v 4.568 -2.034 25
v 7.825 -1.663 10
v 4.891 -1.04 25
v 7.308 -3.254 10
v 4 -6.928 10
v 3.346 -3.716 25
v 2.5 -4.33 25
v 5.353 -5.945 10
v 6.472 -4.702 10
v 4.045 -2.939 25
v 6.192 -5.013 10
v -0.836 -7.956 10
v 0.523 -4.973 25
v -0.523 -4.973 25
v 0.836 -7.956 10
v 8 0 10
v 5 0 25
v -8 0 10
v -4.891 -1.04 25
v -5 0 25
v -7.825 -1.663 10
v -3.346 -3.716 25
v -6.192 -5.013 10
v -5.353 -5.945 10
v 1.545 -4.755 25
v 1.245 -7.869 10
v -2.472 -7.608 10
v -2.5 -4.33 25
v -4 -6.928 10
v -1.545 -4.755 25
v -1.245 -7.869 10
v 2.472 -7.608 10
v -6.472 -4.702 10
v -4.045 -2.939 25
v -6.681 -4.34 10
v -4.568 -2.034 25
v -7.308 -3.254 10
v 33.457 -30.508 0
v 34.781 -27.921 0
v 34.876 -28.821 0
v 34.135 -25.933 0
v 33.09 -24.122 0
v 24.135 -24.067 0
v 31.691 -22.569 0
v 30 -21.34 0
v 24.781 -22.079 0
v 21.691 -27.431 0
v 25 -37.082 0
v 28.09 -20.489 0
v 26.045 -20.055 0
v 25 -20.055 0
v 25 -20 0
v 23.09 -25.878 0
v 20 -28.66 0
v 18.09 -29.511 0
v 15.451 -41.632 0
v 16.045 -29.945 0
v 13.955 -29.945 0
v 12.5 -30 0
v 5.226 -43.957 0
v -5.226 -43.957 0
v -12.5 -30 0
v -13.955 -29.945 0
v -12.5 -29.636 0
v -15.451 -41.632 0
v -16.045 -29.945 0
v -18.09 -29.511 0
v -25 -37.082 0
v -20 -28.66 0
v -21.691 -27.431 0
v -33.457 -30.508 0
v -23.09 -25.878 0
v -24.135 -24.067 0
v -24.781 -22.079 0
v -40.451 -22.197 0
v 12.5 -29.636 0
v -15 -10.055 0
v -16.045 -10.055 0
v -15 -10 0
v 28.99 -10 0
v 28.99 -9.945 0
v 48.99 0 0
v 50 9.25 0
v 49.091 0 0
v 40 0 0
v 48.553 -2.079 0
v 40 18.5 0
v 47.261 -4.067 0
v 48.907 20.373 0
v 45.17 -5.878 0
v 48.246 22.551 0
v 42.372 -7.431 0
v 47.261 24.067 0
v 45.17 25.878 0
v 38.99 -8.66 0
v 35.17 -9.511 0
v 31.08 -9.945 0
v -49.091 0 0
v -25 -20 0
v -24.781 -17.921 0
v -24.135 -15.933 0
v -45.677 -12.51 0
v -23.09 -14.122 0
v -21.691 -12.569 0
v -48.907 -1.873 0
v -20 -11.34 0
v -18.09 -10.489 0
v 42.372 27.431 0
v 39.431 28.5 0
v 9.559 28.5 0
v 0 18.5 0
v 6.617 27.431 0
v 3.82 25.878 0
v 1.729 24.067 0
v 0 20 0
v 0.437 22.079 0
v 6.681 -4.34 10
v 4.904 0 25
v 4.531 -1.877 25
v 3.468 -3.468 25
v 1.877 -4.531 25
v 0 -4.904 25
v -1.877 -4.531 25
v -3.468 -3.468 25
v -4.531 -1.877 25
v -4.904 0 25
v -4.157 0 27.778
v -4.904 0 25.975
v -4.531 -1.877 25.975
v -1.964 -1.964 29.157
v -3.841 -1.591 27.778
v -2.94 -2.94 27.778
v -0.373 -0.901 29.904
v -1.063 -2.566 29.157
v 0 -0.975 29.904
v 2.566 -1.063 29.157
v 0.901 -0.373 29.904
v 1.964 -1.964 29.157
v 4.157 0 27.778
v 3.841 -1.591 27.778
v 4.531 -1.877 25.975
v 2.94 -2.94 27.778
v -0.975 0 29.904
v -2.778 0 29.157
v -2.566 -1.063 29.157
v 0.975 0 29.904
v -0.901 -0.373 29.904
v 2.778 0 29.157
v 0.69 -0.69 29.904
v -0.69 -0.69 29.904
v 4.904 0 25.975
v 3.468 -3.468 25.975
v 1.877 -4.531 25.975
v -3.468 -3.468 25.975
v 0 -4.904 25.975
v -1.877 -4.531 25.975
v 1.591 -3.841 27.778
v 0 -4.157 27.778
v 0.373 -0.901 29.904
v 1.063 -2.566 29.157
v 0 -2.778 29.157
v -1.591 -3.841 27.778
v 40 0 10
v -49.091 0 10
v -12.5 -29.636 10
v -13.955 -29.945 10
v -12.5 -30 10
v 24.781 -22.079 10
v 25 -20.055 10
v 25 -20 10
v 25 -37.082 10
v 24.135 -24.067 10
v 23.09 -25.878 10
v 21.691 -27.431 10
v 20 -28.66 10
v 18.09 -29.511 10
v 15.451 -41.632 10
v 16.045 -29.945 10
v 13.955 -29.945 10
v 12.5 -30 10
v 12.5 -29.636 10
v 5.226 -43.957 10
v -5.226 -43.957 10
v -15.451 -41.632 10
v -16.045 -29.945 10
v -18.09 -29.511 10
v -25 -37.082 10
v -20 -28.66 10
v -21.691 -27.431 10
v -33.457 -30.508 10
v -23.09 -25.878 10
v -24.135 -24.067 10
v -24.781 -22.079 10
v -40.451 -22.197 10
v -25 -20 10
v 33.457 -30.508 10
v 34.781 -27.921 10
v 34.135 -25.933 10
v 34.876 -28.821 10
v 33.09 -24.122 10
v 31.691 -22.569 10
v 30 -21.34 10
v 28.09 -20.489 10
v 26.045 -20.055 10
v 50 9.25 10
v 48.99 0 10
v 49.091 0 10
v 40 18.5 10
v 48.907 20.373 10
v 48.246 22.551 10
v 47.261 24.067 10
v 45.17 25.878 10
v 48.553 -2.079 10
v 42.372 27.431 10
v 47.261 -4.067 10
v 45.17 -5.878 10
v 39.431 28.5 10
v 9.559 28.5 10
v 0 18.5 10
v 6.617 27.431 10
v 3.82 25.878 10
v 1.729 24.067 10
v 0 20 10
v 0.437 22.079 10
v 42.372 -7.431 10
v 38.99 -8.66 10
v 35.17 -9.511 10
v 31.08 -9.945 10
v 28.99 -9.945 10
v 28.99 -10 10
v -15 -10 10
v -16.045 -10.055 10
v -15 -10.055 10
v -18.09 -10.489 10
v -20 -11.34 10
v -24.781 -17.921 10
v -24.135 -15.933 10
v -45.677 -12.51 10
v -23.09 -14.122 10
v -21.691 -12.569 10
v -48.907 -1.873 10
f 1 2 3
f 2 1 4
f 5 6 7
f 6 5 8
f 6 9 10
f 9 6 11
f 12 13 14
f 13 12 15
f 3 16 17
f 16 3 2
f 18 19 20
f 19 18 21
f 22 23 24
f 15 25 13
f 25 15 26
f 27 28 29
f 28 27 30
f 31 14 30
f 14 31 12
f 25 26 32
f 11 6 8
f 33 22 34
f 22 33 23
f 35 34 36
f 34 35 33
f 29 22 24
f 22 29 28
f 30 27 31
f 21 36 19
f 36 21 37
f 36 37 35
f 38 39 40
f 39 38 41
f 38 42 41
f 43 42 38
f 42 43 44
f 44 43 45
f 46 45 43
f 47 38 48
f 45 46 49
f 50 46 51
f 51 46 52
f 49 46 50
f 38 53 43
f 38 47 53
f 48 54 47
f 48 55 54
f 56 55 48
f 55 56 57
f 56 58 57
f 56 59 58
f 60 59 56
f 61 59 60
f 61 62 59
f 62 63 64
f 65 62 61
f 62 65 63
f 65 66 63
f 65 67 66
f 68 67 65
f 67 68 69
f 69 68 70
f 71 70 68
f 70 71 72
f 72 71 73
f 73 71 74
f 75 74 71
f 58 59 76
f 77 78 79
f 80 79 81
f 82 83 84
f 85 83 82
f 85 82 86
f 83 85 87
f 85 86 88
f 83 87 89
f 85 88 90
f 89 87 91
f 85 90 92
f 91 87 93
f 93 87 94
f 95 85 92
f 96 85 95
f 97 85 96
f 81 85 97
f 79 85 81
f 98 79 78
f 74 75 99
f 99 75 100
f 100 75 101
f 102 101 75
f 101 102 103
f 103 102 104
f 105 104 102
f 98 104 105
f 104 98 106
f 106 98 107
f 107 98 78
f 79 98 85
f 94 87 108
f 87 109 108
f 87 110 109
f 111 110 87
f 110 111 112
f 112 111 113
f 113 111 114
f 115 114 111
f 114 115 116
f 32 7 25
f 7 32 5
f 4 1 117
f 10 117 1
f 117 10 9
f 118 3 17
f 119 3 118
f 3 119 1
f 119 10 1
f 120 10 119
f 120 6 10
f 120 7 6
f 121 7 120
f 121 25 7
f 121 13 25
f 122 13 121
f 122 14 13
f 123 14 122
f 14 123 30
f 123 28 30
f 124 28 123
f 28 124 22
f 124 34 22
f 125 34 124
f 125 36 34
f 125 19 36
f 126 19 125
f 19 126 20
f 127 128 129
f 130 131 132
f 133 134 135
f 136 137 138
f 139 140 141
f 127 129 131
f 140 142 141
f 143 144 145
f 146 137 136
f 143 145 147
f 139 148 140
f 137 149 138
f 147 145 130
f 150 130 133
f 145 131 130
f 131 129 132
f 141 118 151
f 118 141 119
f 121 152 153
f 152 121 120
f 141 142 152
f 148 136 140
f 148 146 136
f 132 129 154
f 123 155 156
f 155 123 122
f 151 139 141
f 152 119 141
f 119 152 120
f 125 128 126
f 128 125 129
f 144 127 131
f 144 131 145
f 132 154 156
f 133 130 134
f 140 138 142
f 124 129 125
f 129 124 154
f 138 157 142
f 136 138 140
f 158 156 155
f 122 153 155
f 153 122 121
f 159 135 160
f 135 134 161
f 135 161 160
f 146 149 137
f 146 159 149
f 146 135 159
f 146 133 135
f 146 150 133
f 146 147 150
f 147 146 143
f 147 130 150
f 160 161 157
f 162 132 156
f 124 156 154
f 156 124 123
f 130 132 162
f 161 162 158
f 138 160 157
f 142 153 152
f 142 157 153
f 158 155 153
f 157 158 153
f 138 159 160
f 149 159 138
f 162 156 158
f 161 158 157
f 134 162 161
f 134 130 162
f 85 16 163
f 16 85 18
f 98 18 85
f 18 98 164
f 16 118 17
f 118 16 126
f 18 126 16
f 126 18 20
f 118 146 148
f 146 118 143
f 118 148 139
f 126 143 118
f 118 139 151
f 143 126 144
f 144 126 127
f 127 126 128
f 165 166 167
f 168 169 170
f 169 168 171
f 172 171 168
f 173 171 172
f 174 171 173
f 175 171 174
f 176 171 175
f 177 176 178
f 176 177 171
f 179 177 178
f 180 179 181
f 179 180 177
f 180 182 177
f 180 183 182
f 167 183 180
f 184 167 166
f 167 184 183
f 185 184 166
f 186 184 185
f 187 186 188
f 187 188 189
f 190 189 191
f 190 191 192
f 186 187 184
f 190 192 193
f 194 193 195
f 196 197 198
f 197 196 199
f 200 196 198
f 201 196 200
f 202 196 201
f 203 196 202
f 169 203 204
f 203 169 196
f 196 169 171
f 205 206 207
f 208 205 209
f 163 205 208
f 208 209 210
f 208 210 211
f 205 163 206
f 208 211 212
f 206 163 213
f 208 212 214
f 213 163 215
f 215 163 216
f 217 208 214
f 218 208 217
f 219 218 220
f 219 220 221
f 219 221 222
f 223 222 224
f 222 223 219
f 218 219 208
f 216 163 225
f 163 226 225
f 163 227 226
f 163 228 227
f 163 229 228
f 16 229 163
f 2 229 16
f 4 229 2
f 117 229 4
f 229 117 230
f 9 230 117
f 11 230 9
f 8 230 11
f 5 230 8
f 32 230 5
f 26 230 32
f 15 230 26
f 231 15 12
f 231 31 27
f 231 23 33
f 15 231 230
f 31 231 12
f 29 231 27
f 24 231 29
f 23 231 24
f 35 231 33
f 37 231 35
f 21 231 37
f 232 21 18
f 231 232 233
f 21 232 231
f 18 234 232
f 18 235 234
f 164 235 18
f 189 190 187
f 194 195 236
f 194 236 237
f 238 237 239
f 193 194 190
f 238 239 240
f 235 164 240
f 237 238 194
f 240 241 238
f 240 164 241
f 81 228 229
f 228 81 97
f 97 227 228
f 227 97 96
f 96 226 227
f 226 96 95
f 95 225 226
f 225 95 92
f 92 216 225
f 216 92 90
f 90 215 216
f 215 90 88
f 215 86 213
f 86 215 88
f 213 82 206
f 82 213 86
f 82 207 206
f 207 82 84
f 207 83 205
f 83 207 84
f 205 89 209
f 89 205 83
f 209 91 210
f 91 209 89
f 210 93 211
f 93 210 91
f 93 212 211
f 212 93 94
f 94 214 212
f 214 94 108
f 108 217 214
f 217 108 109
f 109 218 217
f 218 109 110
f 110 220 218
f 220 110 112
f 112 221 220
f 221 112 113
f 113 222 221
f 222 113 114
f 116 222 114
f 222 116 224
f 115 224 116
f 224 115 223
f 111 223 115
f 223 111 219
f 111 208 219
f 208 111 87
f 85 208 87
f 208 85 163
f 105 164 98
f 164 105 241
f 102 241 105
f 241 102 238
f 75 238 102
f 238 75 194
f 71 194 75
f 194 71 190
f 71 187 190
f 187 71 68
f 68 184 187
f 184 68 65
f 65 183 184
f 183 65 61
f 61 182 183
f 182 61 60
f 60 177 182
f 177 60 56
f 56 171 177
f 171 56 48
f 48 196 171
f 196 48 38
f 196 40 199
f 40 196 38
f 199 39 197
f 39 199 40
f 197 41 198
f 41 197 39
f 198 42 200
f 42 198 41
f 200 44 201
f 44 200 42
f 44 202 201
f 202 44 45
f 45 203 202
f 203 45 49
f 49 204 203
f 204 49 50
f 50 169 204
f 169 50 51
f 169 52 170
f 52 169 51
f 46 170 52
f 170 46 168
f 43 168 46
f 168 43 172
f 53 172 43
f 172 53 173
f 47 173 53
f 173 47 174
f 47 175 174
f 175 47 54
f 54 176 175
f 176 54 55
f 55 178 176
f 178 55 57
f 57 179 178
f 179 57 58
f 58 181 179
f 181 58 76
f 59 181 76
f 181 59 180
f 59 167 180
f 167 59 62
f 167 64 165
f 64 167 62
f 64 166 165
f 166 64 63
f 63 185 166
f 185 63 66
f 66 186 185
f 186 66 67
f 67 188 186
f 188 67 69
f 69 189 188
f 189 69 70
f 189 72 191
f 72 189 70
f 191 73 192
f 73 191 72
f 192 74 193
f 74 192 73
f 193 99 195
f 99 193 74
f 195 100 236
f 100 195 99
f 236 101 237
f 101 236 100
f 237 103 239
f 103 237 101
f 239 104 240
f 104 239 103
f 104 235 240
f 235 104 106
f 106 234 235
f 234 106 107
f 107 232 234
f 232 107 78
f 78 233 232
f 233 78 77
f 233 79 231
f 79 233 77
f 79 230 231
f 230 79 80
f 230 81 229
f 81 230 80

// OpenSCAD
//
//  Copyright (C) 18-04-2012 Jasper den Ouden.(ojasper.nl)
//
//  This is free software: you can redistribute it and/or modify
//  it under the terms of the GNU General Public License as published
//  by the Free Software Foundation, either version 3 of the License, or
//  (at your option) any later version.
//

inf = 100;
d=40;
h=18.5;
t=10;
r=d+t;
w=3*t;

module inficube(pos)
{   translate(pos) cube(2*[inf,inf,inf], center=true); }
module infisquare(pos)
{   translate(pos) square(2*[inf,inf], center=true); }

module rounder_cut(r)
{   difference()
    {   square(2*[r,r]);
        circle(r);
    }
}

module holder_profile()
{
    difference()
    {
        translate([0,h/2]) scale([1,(h+3.5*t)/r]) circle(r);
        
        translate([-inf,0]) square([inf+d,h]); //The plank
        infisquare([0,h+10+inf]); //Take of top excess
        infisquare([-inf,inf]); //Not much ontop.
        translate([sqrt(r*r-t*t)-2*t,2*t]) scale([2,1]) rounder_cut(t);
        translate([sqrt(r*r-t*t)-2*t,0]) scale([2,-1]) rounder_cut(t);
        translate([2*t,2*t]) scale([-2,1]) rounder_cut(t);
        
        translate([inf-r/2+t,-3*t/2]) //slide in headphone here.
             square([2*inf,t],center=true);
        translate([r/2,-3*t]) rounder_cut(t);

        translate([-r/2+t,-2*t]) circle(t); //It sits in here.
        translate([r/2-t,-2*t]) circle(t);
        translate([0,-2*t]) square([r/2,2*t],center=true);
    }
}

module holder()
{
    linear_extrude(height=t) holder_profile();
    difference()
    {   union()
        {   cylinder(r1=t,r2=t/2,h=w-t/2);
            translate([0,0,w-t/2]) sphere(t/2);
        }
        translate([0,inf]) inficube();
    }
}

holder();
